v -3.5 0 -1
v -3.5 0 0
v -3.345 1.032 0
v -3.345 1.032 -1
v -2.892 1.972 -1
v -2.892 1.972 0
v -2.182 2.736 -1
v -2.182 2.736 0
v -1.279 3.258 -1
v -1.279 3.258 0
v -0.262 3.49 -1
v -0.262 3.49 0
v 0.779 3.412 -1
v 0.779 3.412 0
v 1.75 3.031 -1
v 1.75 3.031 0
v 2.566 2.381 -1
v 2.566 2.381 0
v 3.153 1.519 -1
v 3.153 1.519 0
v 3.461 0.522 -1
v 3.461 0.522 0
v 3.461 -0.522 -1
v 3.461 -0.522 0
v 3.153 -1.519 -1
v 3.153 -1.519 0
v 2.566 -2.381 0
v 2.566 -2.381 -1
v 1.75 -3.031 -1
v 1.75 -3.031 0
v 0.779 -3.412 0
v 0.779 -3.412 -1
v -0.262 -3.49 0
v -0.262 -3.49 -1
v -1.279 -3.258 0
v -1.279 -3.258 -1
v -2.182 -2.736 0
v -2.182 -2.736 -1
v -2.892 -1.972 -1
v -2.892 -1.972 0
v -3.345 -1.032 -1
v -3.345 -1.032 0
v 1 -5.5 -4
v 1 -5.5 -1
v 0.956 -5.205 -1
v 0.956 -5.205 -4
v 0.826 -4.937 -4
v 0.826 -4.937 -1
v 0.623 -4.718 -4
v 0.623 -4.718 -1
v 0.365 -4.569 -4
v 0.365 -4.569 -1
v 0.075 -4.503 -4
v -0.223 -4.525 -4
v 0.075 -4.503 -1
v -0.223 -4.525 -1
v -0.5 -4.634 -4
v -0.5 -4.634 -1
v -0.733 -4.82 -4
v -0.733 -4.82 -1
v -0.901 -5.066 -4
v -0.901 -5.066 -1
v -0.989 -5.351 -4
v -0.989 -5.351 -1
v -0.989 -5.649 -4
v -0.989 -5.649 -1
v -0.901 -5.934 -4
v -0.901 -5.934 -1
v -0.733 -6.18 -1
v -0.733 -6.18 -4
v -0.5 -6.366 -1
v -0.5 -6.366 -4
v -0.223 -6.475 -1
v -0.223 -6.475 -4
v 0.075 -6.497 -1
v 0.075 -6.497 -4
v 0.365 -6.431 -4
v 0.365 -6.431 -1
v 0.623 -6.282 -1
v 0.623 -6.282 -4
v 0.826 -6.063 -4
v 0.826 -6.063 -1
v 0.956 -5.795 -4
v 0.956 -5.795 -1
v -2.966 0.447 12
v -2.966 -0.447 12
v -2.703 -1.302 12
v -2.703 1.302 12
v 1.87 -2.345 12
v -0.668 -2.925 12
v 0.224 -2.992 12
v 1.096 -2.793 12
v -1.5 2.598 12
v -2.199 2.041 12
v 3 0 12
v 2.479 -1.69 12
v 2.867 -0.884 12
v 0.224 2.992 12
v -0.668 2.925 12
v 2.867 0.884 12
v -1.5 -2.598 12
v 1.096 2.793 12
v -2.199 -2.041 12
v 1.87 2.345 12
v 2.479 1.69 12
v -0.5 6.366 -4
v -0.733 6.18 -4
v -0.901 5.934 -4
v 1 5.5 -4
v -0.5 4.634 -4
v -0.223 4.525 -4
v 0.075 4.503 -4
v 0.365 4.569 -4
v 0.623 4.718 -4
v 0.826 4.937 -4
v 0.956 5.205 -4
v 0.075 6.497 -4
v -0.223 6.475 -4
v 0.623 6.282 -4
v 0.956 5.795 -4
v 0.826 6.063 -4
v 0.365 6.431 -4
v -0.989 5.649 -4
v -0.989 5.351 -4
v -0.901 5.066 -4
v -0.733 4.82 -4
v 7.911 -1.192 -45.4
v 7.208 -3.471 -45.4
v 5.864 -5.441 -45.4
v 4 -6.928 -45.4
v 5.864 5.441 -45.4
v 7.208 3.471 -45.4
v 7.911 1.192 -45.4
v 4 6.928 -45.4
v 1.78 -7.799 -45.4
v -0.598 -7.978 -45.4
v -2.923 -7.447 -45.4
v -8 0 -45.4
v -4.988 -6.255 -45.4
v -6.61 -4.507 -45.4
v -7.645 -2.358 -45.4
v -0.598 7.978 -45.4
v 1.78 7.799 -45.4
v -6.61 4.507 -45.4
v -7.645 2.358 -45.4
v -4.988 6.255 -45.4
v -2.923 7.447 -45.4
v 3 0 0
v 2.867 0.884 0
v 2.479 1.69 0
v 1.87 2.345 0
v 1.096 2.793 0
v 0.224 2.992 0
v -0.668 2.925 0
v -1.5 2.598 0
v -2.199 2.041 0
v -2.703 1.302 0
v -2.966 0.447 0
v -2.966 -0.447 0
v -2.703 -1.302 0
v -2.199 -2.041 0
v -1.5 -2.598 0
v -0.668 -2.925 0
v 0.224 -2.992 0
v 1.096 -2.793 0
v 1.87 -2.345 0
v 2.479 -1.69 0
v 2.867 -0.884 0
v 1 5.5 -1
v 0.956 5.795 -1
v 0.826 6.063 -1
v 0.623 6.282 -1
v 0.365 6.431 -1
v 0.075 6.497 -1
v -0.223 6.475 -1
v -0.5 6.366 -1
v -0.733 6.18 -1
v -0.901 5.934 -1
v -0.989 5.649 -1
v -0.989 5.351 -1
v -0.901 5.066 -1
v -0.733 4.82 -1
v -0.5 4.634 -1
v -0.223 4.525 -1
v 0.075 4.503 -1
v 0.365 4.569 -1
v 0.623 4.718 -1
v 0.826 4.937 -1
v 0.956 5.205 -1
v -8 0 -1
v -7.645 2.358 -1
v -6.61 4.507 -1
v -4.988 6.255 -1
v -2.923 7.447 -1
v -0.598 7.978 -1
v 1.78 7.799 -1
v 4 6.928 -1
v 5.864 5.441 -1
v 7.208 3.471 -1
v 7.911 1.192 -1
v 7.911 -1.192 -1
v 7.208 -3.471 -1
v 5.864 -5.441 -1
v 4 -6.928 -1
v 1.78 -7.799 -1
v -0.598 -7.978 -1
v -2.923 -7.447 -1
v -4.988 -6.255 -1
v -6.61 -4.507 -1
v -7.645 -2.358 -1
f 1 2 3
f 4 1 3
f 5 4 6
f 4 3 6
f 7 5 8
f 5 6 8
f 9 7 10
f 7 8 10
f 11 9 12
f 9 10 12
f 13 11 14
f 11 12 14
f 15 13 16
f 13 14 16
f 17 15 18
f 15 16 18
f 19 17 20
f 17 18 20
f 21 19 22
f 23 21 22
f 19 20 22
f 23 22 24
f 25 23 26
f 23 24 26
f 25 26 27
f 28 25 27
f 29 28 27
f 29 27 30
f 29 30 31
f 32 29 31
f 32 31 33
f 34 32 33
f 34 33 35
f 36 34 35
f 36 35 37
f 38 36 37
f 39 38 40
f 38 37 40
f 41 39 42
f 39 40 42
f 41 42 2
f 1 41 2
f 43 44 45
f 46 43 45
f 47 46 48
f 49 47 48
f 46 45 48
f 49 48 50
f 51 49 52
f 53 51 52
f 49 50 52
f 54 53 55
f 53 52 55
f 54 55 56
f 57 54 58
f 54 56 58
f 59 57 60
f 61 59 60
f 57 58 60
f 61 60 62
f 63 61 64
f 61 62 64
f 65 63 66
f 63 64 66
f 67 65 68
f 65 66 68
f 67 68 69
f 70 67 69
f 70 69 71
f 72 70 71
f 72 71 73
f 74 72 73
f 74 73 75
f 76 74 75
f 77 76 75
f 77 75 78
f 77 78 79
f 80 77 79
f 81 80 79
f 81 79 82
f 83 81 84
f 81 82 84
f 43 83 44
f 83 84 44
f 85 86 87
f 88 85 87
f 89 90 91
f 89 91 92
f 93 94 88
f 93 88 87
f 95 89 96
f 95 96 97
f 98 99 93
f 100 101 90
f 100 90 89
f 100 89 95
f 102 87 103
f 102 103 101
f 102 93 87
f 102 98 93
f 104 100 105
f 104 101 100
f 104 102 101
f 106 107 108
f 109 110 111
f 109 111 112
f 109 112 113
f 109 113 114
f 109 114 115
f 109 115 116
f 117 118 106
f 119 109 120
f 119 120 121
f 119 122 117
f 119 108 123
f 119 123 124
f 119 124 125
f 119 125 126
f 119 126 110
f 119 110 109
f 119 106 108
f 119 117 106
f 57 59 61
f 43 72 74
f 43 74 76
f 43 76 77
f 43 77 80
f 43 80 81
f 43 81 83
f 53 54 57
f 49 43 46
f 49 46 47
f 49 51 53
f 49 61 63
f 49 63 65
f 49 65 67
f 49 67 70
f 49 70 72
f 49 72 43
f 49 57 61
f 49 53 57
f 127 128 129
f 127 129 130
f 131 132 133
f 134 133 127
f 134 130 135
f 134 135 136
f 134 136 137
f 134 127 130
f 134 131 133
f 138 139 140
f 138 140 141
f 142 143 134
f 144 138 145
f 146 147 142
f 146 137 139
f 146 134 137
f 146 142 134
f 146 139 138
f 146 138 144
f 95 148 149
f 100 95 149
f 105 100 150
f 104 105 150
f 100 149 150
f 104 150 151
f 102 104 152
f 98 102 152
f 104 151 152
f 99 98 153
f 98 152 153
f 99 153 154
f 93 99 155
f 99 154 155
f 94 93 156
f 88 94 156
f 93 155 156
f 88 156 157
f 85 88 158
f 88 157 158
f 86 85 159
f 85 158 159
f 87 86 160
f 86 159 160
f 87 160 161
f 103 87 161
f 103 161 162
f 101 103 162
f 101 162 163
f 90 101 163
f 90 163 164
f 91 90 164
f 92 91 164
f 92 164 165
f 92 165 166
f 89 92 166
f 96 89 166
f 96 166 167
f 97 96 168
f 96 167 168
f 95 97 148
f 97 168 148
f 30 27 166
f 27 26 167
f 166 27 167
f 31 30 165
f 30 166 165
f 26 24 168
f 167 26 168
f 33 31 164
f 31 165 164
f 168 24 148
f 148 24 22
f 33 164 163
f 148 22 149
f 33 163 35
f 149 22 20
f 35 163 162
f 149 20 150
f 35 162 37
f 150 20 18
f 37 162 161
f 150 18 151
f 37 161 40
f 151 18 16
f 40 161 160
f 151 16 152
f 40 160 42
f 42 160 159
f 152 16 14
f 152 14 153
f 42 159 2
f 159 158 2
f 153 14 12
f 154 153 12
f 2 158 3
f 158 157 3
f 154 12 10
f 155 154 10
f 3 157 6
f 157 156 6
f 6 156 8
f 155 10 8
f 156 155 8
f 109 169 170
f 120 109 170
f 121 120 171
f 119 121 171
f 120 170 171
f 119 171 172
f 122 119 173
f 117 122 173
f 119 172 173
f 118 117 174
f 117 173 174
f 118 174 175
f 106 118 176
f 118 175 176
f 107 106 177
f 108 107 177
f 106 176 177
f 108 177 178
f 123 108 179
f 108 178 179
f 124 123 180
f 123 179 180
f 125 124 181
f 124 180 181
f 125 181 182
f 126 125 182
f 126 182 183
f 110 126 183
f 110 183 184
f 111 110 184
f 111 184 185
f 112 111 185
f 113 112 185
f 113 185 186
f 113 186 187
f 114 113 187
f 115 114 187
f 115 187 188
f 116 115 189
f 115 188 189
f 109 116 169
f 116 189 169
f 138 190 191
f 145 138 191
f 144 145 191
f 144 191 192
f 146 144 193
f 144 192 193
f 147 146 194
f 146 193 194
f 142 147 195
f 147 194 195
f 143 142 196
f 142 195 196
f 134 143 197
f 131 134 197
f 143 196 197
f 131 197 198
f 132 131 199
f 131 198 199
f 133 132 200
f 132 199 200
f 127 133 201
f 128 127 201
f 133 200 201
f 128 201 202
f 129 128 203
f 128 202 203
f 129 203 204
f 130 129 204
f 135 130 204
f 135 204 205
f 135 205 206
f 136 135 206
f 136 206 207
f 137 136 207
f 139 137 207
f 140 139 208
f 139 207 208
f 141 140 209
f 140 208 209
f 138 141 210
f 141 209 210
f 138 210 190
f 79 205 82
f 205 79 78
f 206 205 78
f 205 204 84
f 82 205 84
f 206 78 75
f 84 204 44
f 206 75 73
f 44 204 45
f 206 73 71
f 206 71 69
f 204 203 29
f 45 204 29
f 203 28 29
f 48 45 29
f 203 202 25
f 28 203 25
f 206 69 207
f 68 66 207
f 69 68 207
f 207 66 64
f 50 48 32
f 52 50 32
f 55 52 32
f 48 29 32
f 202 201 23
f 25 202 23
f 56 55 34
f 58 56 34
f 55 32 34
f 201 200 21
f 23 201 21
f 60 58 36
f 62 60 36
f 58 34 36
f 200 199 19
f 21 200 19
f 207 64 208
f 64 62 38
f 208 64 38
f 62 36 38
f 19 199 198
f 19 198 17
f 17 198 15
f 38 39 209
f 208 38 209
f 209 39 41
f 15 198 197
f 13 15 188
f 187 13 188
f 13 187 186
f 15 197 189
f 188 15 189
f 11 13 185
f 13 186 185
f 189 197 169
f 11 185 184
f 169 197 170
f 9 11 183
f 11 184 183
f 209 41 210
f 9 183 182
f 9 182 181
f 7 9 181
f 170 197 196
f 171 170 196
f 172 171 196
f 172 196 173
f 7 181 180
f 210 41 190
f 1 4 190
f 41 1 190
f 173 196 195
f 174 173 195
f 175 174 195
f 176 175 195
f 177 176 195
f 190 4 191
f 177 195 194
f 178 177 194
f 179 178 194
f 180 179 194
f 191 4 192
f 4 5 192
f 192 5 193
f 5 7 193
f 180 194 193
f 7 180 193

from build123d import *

# Parameters (mm, degrees)
SKETCH1_R           = 3
BOSS_EXTRUDE1_DEPTH = 12
SKETCH2_R           = 3.5
BOSS_EXTRUDE2_DEPTH = 1
SKETCH3_R           = 8
BOSS_EXTRUDE3_DEPTH = 44.4
SKETCH4_R           = 1
CUT_EXTRUDE1_DEPTH  = 3


with BuildPart() as part:
    # Sketch1 → Boss-Extrude1 (new body)
    with BuildSketch(Plane.XY):
        Circle(SKETCH1_R)
    extrude(amount=BOSS_EXTRUDE1_DEPTH)

    # Sketch2 → Boss-Extrude2 (add)
    with BuildSketch(Plane(origin=(0, 0, 0), x_dir=(-1, 0, 0), z_dir=(0, 0, -1))):
        Circle(SKETCH2_R)
    extrude(amount=BOSS_EXTRUDE2_DEPTH)

    # Sketch3 → Boss-Extrude3 (add)
    with BuildSketch(Plane(origin=(0, 0, -1), x_dir=(-1, 0, 0), z_dir=(0, 0, -1))):
        Circle(SKETCH3_R)
    extrude(amount=BOSS_EXTRUDE3_DEPTH)

    # Sketch4 → Cut-Extrude1 (cut)
    with BuildSketch(Plane.XY.offset(-1)):
        with Locations((0, 5.5)):
            Circle(SKETCH4_R)
        with Locations((0, -5.5)):
            Circle(SKETCH4_R)
    extrude(amount=-CUT_EXTRUDE1_DEPTH, mode=Mode.SUBTRACT)


solid = part.part
